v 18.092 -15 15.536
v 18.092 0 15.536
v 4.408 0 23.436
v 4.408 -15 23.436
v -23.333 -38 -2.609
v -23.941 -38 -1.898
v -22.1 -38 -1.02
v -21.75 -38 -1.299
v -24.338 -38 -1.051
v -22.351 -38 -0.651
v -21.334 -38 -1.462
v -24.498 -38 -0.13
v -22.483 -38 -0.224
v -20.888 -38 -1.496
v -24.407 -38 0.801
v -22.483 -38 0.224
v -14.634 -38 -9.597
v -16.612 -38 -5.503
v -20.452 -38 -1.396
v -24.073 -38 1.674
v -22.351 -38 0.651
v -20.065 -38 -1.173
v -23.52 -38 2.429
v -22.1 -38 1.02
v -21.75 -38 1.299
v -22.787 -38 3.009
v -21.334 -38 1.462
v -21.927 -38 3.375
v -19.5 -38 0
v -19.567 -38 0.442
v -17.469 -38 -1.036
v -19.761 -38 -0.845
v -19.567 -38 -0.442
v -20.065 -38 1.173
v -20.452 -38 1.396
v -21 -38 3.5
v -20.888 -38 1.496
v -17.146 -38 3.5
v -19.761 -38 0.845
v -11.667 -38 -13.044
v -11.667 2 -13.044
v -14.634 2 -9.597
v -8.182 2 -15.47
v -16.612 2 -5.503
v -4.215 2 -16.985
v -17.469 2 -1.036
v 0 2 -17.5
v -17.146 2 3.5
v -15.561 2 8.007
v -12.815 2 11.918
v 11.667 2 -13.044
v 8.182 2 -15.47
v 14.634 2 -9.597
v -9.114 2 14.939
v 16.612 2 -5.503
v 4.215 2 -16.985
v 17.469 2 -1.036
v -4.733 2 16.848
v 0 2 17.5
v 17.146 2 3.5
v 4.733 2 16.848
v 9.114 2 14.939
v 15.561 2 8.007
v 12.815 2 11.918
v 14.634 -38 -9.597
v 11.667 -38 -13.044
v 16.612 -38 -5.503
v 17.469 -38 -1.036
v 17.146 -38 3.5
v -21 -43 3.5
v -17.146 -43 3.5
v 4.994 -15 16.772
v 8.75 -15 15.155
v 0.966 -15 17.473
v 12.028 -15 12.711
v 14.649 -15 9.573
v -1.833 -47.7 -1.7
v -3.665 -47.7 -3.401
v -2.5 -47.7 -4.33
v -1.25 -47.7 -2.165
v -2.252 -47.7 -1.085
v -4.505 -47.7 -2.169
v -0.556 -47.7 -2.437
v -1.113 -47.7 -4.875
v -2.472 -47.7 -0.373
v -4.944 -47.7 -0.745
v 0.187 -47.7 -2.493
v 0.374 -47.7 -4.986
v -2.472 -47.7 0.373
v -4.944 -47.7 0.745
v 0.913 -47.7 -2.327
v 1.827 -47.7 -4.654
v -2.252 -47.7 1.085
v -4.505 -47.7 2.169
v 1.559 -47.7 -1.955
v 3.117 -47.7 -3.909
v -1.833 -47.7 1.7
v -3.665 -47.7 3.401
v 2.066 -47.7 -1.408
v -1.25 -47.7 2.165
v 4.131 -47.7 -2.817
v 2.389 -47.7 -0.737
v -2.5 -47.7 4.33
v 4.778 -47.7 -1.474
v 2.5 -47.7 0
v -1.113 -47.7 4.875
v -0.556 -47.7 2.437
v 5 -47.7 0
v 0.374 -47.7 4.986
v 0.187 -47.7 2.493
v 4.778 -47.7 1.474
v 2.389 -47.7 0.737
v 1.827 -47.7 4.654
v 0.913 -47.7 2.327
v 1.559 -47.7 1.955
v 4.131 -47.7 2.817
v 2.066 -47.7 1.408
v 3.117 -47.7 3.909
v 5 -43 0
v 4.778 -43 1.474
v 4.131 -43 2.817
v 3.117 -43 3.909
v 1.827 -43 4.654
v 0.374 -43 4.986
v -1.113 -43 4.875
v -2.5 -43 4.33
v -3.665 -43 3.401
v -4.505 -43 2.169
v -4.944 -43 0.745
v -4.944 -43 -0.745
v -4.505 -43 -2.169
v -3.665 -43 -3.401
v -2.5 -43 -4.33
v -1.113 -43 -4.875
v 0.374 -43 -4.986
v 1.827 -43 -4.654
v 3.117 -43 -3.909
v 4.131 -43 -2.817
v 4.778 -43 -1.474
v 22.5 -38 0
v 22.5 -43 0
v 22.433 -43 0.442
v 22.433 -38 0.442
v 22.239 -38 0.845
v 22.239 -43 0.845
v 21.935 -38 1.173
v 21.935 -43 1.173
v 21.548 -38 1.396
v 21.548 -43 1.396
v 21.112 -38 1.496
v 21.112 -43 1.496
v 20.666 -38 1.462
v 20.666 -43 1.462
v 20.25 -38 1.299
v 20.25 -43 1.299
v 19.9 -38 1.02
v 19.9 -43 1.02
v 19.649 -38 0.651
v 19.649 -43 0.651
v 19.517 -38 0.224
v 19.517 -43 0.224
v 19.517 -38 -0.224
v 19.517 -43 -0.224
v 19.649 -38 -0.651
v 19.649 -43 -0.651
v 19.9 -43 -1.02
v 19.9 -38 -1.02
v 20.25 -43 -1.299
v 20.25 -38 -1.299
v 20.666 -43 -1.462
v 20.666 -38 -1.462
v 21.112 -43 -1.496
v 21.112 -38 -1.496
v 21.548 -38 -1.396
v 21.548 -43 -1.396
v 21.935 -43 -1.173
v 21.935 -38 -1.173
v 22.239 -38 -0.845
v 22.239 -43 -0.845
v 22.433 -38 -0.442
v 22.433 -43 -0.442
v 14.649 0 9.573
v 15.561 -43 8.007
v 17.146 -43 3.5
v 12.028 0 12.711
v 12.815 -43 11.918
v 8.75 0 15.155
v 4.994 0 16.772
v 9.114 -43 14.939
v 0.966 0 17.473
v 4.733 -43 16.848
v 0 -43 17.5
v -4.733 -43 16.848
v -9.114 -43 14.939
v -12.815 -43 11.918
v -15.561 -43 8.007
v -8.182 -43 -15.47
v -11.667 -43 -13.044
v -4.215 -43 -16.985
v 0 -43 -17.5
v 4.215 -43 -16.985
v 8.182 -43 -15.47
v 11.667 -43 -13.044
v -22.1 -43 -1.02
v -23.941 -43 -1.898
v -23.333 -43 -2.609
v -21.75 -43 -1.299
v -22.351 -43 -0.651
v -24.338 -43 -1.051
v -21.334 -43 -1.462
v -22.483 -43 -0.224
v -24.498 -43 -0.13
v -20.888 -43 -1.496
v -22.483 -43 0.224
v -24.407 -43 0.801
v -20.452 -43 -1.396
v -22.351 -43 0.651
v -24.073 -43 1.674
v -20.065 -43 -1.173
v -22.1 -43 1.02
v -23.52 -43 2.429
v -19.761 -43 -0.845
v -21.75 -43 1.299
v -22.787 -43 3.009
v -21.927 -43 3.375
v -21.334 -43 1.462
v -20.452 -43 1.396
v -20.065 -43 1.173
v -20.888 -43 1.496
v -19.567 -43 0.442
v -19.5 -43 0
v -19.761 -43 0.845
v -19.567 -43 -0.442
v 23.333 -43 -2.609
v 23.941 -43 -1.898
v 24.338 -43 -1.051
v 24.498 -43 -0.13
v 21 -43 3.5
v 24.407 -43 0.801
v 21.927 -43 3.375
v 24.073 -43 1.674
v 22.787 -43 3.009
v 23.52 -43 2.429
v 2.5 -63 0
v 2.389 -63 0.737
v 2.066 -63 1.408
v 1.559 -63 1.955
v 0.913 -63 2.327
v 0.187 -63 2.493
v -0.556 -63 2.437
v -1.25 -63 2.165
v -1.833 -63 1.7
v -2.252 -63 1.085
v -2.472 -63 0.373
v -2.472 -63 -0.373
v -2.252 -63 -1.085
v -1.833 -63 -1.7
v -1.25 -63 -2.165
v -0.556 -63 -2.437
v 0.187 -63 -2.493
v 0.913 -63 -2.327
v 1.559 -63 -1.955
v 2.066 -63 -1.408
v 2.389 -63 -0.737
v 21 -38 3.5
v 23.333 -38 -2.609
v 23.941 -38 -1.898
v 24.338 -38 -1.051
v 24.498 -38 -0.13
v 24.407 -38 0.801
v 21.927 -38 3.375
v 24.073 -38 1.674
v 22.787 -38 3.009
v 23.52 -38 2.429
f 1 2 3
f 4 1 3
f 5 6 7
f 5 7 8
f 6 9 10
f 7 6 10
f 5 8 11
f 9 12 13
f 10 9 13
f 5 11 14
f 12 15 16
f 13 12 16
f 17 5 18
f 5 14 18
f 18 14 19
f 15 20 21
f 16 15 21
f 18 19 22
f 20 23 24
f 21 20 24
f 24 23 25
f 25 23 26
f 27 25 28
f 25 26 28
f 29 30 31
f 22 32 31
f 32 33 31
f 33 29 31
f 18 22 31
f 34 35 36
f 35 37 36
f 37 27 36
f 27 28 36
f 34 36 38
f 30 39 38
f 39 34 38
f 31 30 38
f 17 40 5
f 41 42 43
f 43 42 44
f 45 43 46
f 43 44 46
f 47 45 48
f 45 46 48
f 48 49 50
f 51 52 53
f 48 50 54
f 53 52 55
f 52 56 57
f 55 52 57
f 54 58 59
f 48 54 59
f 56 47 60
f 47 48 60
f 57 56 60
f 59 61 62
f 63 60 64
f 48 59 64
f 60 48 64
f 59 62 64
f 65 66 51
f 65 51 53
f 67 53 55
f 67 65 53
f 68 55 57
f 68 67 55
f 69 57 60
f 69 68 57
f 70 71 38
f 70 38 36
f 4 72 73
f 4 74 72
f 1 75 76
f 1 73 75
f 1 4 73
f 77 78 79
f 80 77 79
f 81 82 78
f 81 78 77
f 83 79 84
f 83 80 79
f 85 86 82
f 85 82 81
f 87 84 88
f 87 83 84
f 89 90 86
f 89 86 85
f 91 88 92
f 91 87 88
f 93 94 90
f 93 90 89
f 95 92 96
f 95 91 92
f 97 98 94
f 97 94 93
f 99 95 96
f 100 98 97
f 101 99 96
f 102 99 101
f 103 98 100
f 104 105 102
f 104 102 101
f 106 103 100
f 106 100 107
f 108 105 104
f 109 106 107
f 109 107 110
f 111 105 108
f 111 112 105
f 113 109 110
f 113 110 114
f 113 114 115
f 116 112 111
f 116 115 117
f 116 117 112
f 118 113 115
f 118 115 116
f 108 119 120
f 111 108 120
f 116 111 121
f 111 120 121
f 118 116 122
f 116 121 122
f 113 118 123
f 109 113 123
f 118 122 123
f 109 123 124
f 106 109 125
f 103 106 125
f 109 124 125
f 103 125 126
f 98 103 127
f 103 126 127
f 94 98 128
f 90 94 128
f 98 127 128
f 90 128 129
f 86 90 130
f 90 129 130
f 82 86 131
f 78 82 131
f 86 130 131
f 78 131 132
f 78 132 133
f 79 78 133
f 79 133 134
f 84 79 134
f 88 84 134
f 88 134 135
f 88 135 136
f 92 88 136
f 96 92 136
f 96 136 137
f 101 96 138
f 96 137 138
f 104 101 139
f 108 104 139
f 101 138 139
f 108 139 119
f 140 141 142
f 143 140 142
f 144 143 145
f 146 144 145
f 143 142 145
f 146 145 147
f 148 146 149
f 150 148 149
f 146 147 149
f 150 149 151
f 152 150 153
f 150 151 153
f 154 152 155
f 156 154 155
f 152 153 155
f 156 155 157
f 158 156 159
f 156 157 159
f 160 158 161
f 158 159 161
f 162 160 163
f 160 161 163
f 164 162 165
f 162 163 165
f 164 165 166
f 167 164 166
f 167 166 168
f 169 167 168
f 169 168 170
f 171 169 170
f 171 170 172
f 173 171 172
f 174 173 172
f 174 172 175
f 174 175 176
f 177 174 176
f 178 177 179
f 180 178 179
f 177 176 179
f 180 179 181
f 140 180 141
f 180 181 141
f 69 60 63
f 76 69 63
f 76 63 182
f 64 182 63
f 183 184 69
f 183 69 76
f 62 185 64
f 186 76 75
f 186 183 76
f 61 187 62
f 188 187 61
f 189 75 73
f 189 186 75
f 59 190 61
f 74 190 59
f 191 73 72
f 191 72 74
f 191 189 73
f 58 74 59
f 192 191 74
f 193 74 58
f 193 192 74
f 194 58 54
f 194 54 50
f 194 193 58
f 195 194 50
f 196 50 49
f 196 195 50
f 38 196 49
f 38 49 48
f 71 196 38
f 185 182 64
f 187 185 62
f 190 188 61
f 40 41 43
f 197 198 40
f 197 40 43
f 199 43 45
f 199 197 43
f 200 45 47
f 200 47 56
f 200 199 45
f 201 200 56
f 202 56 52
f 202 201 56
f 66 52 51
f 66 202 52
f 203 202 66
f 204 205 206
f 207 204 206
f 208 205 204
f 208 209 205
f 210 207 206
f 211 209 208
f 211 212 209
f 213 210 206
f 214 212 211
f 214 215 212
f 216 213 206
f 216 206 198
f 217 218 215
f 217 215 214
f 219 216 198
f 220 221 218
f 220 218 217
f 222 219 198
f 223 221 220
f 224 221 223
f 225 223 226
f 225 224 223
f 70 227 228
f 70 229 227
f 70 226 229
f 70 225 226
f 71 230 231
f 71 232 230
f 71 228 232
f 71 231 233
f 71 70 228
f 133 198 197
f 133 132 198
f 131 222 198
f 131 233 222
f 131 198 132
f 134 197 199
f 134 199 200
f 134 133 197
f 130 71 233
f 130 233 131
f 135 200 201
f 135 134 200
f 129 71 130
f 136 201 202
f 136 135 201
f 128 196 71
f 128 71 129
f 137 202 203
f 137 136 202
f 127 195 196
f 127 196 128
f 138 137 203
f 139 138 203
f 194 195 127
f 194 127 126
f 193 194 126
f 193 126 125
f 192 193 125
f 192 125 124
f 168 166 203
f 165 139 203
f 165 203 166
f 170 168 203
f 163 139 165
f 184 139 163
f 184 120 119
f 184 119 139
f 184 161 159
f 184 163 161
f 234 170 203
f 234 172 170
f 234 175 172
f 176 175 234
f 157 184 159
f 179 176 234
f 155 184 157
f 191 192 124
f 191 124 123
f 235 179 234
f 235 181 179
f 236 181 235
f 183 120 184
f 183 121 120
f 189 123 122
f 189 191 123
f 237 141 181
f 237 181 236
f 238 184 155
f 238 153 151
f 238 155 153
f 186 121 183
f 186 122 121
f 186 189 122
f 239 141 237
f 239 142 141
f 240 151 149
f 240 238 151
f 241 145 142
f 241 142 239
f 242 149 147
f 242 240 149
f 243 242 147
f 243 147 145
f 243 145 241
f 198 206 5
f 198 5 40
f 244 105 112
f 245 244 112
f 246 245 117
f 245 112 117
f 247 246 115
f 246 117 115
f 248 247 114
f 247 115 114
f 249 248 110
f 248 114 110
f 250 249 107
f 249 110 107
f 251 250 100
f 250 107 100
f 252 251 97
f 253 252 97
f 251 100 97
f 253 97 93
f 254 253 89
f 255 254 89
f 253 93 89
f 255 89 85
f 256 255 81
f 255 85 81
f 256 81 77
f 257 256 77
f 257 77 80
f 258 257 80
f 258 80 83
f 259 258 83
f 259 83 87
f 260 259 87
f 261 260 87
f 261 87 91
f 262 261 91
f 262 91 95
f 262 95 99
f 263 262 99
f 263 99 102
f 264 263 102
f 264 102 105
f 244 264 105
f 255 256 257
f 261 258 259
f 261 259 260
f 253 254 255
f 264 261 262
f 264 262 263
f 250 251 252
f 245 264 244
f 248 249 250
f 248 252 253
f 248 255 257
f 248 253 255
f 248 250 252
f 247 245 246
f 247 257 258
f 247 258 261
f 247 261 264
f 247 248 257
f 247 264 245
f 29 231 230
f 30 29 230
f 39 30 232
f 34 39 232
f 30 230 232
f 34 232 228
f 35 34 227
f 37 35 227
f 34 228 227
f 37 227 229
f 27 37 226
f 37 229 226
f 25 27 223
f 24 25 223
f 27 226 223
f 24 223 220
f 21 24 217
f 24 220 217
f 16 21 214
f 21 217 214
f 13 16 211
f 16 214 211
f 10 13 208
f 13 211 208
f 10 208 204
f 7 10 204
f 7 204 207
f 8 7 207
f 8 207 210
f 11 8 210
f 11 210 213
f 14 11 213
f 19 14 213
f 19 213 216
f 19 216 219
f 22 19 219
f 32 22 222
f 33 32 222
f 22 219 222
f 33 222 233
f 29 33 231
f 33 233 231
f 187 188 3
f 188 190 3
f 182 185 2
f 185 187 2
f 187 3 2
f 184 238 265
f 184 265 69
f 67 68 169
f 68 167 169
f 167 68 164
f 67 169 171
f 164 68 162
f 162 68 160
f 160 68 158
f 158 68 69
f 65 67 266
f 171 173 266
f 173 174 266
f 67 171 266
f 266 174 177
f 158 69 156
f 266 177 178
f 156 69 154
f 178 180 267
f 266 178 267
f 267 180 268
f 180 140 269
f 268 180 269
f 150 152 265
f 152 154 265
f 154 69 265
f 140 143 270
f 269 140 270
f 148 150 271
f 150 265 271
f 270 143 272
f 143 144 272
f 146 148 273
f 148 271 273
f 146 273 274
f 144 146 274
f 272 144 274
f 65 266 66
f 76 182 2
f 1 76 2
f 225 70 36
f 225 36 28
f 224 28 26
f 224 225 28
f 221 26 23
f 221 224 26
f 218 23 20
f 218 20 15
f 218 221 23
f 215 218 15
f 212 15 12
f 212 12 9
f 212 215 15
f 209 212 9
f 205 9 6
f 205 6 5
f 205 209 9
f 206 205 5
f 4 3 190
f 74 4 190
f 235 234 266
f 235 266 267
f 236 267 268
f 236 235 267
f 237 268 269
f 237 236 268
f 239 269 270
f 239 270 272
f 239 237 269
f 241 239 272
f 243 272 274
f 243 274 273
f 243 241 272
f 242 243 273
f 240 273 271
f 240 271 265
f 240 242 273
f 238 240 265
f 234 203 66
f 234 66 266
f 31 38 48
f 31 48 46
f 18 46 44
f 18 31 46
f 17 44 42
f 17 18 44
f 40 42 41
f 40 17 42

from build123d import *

# Parameters (mm, degrees)
F0_R     = 5
F0_R_2   = 1.5
F0_R_3   = 2.5
F1_DEPTH = 5
F2_DEPTH = 45
F3_DEPTH = 4.7
F4_DEPTH = 20
F7_DEPTH = 15


with BuildPart() as f1:
    # F0 (on Front) → F1 (new body)
    with BuildSketch(Plane.XZ):
        with BuildLine():
            ThreePointArc((-17.146428, 3.5), (-16.612416, -5.502512), (-11.666667, -13.04373))
            ThreePointArc((-11.666667, -13.04373), (0, -17.5), (11.666667, -13.04373))
            ThreePointArc((11.666667, -13.04373), (16.612416, -5.502512), (17.146428, 3.5))
            ThreePointArc((17.146428, 3.5), (0, 17.5), (-17.146428, 3.5))
        make_face()
        Circle(F0_R, mode=Mode.SUBTRACT)
        with BuildLine():
            Line((-23.333333, -2.608746), (-11.666667, -13.04373))
            ThreePointArc((-11.666667, -13.04373), (-16.612416, -5.502512), (-17.146428, 3.5))
            Line((-17.146428, 3.5), (-21, 3.5))
            ThreePointArc((-21, 3.5), (-24.269603, 1.248877), (-23.333333, -2.608746))
        make_face()
        with Locations((-21, 0)):
            Circle(F0_R_2, mode=Mode.SUBTRACT)
        Circle(F0_R_3)
        with BuildLine():
            ThreePointArc((17.146428, 3.5), (16.612416, -5.502512), (11.666667, -13.04373))
            Line((11.666667, -13.04373), (23.333333, -2.608746))
            ThreePointArc((23.333333, -2.608746), (24.269603, 1.248877), (21, 3.5))
            Line((21, 3.5), (17.146428, 3.5))
        make_face()
        with Locations((21, 0)):
            Circle(F0_R_2, mode=Mode.SUBTRACT)
        Circle(F0_R)
        Circle(F0_R_3, mode=Mode.SUBTRACT)
    extrude(amount=-F1_DEPTH)

    # F0 (on Front) → F2 (join)
    with BuildSketch(Plane.XZ):
        with BuildLine():
            ThreePointArc((-17.146428, 3.5), (-16.612416, -5.502512), (-11.666667, -13.04373))
            ThreePointArc((-11.666667, -13.04373), (0, -17.5), (11.666667, -13.04373))
            ThreePointArc((11.666667, -13.04373), (16.612416, -5.502512), (17.146428, 3.5))
            ThreePointArc((17.146428, 3.5), (0, 17.5), (-17.146428, 3.5))
        make_face()
        Circle(F0_R, mode=Mode.SUBTRACT)
        Circle(F0_R)
        Circle(F0_R_3, mode=Mode.SUBTRACT)
        Circle(F0_R_3)
    extrude(amount=-F2_DEPTH)

    # F0 (on Front) → F3 (join)
    with BuildSketch(Plane.XZ):
        Circle(F0_R)
        Circle(F0_R_3, mode=Mode.SUBTRACT)
        Circle(F0_R_3)
    extrude(amount=F3_DEPTH)

    # F0 (on Front) → F4 (join)
    with BuildSketch(Plane.XZ):
        Circle(F0_R_3)
    extrude(amount=F4_DEPTH)


with BuildPart() as f1_1:
    # F5: moved
    add(f1.part.moved(Location((0, -43, 0))))

    # F6 (on Front) → F7 (join)
    with BuildSketch(Plane.XZ):
        Polygon((18.091601, 15.535572), (4.408399, 23.435572), (0.966088, 17.473313), (14.649289, 9.573313), align=None)
    extrude(amount=F7_DEPTH)


solid = f1_1.part
